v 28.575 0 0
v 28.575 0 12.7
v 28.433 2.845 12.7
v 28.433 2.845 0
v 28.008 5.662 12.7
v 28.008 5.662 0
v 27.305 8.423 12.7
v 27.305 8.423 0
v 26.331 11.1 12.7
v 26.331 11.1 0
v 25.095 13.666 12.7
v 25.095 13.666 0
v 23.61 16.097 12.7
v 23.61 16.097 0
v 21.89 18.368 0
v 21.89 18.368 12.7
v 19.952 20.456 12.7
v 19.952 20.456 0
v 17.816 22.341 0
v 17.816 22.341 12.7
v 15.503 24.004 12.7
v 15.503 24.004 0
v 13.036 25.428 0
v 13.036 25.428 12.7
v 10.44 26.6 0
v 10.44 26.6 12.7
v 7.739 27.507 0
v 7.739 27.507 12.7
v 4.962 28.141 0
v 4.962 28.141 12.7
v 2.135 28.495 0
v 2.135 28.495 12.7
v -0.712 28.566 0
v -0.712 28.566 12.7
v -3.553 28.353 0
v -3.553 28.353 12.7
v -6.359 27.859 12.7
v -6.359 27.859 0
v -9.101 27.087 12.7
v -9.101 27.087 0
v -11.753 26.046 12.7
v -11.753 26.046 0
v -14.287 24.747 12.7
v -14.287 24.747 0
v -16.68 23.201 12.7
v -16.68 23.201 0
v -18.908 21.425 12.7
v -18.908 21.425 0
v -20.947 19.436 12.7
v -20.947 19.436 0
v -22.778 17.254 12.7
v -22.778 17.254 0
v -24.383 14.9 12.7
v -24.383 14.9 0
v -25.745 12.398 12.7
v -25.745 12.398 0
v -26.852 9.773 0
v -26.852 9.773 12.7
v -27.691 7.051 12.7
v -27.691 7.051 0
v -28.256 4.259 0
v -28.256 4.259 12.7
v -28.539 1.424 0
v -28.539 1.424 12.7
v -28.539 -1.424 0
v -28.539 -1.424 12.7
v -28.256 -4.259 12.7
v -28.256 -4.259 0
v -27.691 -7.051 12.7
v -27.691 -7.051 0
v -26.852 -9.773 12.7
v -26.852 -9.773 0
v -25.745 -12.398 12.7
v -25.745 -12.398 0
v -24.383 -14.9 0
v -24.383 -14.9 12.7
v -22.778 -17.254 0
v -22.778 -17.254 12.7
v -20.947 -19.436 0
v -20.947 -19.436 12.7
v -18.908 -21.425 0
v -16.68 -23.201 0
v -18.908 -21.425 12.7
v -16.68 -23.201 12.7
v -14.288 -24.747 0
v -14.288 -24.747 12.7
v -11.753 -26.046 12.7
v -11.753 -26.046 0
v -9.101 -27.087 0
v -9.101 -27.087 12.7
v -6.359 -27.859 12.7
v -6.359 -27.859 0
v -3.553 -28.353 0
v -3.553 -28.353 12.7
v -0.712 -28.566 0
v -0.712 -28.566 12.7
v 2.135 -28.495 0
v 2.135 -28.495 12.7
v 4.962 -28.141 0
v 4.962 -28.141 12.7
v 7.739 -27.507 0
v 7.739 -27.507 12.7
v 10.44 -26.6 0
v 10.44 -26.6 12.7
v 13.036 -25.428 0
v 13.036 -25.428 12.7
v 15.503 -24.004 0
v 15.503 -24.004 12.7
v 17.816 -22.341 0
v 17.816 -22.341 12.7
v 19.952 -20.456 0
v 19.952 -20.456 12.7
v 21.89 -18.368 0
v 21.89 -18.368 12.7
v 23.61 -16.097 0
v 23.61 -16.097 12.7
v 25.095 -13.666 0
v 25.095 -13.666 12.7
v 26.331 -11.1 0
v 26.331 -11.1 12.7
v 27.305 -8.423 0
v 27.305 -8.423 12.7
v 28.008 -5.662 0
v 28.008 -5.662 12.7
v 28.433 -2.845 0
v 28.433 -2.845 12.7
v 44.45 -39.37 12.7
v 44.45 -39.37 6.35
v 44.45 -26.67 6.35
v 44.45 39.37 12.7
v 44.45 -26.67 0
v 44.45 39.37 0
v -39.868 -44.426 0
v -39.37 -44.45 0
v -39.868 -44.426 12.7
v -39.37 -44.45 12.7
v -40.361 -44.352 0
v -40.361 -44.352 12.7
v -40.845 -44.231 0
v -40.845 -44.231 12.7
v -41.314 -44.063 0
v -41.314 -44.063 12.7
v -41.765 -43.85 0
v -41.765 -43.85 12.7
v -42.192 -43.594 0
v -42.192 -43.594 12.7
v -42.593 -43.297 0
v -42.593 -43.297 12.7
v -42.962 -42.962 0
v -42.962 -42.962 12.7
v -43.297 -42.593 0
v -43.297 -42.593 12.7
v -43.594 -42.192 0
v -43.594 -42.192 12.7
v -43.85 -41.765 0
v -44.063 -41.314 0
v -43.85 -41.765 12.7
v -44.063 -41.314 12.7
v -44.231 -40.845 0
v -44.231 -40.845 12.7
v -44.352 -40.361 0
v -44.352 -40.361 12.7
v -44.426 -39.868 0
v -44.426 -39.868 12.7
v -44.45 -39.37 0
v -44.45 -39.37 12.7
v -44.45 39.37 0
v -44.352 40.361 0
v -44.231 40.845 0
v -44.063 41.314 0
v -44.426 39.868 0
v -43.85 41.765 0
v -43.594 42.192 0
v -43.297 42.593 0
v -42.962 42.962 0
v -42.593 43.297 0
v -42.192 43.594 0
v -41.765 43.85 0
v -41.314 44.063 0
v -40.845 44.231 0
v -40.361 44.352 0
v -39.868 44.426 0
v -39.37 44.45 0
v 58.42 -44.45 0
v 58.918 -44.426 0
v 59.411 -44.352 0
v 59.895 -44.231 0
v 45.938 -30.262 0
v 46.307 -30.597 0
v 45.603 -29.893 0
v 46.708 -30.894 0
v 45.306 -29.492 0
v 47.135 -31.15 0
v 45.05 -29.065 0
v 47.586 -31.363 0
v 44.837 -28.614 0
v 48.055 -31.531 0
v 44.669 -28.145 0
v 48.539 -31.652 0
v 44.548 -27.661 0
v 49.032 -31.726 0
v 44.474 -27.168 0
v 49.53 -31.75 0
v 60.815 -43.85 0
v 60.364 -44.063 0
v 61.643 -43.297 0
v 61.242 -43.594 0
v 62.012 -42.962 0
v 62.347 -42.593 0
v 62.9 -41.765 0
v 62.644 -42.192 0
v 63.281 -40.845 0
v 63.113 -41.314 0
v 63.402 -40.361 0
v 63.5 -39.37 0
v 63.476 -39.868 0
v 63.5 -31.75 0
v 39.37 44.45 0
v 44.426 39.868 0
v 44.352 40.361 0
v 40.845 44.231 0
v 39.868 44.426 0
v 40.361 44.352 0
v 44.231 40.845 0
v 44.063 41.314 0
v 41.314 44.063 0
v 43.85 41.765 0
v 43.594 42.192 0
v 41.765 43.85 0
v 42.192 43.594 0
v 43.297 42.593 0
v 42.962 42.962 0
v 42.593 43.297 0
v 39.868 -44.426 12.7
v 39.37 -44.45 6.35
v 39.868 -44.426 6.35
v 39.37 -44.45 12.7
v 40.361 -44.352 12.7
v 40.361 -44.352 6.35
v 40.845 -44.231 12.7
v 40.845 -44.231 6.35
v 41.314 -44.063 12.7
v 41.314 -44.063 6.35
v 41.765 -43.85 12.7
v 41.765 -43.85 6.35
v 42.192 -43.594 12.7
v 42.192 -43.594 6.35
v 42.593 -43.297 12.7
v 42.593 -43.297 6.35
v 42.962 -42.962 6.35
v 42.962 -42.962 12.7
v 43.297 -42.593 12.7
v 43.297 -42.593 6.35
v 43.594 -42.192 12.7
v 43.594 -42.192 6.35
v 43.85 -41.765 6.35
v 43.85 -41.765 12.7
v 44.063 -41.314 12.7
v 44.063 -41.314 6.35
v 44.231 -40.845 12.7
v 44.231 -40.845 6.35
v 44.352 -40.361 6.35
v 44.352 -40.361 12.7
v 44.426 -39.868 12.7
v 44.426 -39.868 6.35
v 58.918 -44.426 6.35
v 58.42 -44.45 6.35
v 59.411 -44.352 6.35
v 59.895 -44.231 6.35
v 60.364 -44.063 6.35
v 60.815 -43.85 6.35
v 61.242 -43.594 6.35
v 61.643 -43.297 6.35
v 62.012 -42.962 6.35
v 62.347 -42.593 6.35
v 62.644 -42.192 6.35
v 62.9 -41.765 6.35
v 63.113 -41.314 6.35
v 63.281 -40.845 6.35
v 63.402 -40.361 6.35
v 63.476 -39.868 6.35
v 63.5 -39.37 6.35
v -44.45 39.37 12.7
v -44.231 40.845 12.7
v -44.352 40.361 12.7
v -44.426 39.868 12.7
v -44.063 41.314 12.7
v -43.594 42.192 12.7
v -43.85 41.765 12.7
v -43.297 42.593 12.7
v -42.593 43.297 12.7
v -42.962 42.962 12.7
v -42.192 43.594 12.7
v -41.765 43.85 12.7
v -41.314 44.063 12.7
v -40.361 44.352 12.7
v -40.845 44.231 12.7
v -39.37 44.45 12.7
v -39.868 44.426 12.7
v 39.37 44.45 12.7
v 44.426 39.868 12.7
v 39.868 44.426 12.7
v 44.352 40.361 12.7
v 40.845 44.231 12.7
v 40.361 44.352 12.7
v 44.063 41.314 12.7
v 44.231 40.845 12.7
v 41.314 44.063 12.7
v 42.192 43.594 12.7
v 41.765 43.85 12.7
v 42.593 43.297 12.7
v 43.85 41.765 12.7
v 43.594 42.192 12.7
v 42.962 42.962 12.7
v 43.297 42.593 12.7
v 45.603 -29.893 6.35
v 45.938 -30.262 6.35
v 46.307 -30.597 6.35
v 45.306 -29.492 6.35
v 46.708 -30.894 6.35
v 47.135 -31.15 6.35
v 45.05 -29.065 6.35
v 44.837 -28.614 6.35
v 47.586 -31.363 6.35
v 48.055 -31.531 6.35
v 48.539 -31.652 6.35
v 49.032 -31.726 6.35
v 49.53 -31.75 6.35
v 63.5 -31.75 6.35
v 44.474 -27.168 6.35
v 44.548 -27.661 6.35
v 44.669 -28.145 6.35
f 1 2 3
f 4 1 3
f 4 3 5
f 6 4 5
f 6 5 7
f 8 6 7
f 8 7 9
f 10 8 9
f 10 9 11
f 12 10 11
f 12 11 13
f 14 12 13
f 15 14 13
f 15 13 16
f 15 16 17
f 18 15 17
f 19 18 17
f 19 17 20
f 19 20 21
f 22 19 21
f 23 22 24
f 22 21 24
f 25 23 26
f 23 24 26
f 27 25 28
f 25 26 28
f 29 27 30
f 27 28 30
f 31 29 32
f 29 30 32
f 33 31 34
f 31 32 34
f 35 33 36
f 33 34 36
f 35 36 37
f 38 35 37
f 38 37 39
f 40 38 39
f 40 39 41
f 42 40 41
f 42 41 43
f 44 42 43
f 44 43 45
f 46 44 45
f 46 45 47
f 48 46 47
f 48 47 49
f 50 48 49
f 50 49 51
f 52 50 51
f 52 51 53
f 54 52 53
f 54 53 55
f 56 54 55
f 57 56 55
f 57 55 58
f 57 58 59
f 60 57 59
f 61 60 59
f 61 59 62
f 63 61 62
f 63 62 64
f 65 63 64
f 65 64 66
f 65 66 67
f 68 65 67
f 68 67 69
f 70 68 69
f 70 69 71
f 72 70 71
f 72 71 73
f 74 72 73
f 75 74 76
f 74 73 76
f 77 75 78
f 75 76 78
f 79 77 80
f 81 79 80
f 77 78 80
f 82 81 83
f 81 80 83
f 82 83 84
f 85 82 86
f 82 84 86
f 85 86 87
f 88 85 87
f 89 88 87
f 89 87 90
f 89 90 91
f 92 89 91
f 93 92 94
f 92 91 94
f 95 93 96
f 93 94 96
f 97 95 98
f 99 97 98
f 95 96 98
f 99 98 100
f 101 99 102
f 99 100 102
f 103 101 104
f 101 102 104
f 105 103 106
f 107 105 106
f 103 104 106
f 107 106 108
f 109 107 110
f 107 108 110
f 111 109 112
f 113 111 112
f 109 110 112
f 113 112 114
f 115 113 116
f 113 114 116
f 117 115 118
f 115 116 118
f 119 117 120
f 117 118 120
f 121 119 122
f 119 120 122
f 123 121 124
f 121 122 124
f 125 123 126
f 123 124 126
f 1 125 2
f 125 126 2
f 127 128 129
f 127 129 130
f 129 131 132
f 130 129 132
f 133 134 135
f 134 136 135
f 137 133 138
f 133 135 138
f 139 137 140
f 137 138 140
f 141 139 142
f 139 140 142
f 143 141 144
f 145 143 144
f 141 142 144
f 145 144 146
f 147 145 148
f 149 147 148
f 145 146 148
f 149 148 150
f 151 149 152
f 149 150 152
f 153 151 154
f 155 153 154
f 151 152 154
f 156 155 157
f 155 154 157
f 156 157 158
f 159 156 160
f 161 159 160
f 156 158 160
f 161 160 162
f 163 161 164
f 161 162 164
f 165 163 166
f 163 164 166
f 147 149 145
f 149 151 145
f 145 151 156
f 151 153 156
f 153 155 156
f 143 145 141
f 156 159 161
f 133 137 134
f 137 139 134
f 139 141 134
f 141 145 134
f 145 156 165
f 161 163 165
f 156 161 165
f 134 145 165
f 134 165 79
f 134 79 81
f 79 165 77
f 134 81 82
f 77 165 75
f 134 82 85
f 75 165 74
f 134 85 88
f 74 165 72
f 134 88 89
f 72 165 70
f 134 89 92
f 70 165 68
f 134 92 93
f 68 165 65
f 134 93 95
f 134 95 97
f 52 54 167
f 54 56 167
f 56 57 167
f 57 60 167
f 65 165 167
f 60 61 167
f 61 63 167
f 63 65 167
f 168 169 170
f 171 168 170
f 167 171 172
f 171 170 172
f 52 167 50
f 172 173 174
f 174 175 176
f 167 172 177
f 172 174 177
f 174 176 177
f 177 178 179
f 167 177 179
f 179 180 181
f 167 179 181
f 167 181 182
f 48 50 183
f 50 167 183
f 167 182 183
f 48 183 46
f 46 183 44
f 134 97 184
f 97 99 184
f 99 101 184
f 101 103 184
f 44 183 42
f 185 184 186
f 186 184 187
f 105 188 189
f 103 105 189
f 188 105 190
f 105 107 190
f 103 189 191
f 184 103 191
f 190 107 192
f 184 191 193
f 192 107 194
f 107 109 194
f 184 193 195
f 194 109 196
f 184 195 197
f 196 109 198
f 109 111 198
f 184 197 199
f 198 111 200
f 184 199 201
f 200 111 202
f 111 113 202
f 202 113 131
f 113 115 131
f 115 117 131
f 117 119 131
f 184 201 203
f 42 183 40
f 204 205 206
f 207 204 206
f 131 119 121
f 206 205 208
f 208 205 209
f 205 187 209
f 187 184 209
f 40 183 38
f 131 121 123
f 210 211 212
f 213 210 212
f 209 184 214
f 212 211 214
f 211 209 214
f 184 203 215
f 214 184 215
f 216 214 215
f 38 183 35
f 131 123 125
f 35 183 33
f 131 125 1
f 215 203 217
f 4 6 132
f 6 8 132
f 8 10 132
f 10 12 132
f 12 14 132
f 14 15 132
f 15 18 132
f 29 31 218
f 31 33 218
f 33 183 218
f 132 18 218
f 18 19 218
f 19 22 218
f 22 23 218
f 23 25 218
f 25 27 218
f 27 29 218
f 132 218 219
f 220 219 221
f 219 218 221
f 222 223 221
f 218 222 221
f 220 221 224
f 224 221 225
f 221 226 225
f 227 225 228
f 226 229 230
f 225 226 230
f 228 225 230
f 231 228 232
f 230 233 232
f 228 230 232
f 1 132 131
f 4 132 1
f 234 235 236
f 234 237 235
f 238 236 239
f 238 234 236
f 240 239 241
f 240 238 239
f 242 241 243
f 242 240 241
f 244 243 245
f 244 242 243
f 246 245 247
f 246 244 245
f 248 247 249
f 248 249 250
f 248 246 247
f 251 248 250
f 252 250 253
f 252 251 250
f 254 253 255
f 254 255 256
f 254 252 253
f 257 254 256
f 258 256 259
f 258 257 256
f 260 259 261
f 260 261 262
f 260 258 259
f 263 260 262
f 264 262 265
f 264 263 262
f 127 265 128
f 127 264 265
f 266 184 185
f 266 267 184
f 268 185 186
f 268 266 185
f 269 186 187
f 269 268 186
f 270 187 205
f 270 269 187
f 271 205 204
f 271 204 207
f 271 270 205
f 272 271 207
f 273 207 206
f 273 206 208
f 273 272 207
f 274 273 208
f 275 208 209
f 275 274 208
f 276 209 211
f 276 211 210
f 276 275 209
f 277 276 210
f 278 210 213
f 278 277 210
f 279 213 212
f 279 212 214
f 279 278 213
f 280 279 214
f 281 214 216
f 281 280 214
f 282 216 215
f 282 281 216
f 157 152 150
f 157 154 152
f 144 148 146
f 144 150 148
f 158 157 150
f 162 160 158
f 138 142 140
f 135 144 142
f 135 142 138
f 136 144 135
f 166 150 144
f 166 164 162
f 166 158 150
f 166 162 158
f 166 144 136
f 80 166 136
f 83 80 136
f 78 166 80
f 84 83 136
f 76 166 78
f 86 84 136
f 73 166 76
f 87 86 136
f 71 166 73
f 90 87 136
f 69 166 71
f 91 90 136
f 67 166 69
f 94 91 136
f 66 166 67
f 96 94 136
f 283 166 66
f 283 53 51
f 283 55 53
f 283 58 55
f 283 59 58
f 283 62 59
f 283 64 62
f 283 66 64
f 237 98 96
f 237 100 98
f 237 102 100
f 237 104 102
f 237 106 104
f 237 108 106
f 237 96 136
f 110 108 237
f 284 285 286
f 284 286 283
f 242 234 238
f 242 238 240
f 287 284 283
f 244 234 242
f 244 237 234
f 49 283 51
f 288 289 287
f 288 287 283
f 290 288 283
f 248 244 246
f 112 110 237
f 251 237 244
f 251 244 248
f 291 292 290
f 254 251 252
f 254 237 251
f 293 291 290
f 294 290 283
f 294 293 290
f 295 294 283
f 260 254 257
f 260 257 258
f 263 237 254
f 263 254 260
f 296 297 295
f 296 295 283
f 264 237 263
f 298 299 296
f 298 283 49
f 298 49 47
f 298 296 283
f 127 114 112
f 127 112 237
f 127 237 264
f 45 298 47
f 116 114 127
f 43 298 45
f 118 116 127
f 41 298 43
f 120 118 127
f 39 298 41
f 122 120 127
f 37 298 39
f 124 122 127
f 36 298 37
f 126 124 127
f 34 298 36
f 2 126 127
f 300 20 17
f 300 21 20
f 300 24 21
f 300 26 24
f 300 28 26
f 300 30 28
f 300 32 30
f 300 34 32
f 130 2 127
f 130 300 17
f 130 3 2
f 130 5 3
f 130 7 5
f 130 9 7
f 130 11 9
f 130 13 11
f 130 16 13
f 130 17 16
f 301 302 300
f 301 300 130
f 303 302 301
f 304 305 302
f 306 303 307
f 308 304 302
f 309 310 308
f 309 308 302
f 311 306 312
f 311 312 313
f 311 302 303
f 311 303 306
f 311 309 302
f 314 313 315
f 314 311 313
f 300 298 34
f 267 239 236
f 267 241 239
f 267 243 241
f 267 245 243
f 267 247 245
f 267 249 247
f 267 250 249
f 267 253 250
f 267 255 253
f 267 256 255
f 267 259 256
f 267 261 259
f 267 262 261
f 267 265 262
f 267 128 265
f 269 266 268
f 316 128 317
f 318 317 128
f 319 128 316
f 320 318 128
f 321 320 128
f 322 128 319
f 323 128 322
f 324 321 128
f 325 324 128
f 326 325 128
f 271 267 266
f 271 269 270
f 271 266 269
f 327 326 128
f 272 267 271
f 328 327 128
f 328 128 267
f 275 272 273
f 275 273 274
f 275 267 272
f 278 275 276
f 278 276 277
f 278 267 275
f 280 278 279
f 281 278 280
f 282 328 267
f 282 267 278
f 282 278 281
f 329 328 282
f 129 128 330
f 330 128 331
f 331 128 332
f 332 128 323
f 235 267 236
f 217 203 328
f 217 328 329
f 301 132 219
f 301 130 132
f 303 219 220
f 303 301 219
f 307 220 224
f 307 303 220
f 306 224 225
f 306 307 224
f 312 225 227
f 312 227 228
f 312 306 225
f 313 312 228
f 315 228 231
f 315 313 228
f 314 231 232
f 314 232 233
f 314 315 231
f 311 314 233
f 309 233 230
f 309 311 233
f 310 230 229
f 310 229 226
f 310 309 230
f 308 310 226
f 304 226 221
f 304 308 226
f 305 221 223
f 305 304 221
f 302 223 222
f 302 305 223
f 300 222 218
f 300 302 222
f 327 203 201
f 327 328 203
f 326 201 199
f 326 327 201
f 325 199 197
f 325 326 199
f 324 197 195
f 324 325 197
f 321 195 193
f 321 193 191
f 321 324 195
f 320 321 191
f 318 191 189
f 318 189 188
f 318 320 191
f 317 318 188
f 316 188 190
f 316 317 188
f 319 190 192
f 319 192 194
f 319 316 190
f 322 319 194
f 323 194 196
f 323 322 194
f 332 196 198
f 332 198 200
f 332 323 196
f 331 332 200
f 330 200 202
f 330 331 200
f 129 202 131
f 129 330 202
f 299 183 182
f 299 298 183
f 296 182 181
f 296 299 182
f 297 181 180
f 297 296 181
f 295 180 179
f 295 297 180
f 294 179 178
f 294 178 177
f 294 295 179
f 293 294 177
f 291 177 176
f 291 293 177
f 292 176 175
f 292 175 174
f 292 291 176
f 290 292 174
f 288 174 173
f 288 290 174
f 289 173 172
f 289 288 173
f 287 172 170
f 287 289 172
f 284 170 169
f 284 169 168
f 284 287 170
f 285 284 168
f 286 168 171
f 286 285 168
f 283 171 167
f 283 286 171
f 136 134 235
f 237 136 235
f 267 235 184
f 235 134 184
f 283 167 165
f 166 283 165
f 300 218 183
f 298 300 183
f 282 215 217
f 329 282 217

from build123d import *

# Parameters (mm, degrees)
F1_DEPTH = 12.7
F0_W     = 19.05
F0_H     = 12.7
F2_DEPTH = 6.35
F3_R     = 5.08
F4_R     = 5.08
F5_R     = 28.575
F6_DEPTH = 25.4


with BuildPart() as f1:
    # F0 (on Top) → F1 (new body)
    with BuildSketch(Plane.XY):
        Polygon((44.45, 44.45), (-44.45, 44.45), (-44.45, -44.45), (44.45, -44.45), (44.45, -31.75), align=None)
    extrude(amount=F1_DEPTH)

    # F0 (on Top) → F2 (join)
    with BuildSketch(Plane.XY):
        with Locations((53.975, -38.1)):
            Rectangle(F0_W, F0_H)
    extrude(amount=F2_DEPTH)

    # F3
    f3_edges = [f1.edges().sort_by_distance(p)[0] for p in [
        (-44.45, -44.45, 6.35),
        (-44.45, 44.45, 6.35),
        (44.45, 44.45, 6.35),
        (44.45, -31.75, 3.175),
    ]]
    fillet(f3_edges, radius=F3_R)

    # F4
    f4_edges = [f1.edges().sort_by_distance(p)[0] for p in [
        (44.45, -44.45, 9.525),
        (63.5, -44.45, 3.175),
    ]]
    fillet(f4_edges, radius=F4_R)

    # F5 (on face) → F6 (cut)
    with BuildSketch(Plane.XY.offset(12.7)):
        Circle(F5_R)
    extrude(amount=-F6_DEPTH, mode=Mode.SUBTRACT)


solid = f1.part
